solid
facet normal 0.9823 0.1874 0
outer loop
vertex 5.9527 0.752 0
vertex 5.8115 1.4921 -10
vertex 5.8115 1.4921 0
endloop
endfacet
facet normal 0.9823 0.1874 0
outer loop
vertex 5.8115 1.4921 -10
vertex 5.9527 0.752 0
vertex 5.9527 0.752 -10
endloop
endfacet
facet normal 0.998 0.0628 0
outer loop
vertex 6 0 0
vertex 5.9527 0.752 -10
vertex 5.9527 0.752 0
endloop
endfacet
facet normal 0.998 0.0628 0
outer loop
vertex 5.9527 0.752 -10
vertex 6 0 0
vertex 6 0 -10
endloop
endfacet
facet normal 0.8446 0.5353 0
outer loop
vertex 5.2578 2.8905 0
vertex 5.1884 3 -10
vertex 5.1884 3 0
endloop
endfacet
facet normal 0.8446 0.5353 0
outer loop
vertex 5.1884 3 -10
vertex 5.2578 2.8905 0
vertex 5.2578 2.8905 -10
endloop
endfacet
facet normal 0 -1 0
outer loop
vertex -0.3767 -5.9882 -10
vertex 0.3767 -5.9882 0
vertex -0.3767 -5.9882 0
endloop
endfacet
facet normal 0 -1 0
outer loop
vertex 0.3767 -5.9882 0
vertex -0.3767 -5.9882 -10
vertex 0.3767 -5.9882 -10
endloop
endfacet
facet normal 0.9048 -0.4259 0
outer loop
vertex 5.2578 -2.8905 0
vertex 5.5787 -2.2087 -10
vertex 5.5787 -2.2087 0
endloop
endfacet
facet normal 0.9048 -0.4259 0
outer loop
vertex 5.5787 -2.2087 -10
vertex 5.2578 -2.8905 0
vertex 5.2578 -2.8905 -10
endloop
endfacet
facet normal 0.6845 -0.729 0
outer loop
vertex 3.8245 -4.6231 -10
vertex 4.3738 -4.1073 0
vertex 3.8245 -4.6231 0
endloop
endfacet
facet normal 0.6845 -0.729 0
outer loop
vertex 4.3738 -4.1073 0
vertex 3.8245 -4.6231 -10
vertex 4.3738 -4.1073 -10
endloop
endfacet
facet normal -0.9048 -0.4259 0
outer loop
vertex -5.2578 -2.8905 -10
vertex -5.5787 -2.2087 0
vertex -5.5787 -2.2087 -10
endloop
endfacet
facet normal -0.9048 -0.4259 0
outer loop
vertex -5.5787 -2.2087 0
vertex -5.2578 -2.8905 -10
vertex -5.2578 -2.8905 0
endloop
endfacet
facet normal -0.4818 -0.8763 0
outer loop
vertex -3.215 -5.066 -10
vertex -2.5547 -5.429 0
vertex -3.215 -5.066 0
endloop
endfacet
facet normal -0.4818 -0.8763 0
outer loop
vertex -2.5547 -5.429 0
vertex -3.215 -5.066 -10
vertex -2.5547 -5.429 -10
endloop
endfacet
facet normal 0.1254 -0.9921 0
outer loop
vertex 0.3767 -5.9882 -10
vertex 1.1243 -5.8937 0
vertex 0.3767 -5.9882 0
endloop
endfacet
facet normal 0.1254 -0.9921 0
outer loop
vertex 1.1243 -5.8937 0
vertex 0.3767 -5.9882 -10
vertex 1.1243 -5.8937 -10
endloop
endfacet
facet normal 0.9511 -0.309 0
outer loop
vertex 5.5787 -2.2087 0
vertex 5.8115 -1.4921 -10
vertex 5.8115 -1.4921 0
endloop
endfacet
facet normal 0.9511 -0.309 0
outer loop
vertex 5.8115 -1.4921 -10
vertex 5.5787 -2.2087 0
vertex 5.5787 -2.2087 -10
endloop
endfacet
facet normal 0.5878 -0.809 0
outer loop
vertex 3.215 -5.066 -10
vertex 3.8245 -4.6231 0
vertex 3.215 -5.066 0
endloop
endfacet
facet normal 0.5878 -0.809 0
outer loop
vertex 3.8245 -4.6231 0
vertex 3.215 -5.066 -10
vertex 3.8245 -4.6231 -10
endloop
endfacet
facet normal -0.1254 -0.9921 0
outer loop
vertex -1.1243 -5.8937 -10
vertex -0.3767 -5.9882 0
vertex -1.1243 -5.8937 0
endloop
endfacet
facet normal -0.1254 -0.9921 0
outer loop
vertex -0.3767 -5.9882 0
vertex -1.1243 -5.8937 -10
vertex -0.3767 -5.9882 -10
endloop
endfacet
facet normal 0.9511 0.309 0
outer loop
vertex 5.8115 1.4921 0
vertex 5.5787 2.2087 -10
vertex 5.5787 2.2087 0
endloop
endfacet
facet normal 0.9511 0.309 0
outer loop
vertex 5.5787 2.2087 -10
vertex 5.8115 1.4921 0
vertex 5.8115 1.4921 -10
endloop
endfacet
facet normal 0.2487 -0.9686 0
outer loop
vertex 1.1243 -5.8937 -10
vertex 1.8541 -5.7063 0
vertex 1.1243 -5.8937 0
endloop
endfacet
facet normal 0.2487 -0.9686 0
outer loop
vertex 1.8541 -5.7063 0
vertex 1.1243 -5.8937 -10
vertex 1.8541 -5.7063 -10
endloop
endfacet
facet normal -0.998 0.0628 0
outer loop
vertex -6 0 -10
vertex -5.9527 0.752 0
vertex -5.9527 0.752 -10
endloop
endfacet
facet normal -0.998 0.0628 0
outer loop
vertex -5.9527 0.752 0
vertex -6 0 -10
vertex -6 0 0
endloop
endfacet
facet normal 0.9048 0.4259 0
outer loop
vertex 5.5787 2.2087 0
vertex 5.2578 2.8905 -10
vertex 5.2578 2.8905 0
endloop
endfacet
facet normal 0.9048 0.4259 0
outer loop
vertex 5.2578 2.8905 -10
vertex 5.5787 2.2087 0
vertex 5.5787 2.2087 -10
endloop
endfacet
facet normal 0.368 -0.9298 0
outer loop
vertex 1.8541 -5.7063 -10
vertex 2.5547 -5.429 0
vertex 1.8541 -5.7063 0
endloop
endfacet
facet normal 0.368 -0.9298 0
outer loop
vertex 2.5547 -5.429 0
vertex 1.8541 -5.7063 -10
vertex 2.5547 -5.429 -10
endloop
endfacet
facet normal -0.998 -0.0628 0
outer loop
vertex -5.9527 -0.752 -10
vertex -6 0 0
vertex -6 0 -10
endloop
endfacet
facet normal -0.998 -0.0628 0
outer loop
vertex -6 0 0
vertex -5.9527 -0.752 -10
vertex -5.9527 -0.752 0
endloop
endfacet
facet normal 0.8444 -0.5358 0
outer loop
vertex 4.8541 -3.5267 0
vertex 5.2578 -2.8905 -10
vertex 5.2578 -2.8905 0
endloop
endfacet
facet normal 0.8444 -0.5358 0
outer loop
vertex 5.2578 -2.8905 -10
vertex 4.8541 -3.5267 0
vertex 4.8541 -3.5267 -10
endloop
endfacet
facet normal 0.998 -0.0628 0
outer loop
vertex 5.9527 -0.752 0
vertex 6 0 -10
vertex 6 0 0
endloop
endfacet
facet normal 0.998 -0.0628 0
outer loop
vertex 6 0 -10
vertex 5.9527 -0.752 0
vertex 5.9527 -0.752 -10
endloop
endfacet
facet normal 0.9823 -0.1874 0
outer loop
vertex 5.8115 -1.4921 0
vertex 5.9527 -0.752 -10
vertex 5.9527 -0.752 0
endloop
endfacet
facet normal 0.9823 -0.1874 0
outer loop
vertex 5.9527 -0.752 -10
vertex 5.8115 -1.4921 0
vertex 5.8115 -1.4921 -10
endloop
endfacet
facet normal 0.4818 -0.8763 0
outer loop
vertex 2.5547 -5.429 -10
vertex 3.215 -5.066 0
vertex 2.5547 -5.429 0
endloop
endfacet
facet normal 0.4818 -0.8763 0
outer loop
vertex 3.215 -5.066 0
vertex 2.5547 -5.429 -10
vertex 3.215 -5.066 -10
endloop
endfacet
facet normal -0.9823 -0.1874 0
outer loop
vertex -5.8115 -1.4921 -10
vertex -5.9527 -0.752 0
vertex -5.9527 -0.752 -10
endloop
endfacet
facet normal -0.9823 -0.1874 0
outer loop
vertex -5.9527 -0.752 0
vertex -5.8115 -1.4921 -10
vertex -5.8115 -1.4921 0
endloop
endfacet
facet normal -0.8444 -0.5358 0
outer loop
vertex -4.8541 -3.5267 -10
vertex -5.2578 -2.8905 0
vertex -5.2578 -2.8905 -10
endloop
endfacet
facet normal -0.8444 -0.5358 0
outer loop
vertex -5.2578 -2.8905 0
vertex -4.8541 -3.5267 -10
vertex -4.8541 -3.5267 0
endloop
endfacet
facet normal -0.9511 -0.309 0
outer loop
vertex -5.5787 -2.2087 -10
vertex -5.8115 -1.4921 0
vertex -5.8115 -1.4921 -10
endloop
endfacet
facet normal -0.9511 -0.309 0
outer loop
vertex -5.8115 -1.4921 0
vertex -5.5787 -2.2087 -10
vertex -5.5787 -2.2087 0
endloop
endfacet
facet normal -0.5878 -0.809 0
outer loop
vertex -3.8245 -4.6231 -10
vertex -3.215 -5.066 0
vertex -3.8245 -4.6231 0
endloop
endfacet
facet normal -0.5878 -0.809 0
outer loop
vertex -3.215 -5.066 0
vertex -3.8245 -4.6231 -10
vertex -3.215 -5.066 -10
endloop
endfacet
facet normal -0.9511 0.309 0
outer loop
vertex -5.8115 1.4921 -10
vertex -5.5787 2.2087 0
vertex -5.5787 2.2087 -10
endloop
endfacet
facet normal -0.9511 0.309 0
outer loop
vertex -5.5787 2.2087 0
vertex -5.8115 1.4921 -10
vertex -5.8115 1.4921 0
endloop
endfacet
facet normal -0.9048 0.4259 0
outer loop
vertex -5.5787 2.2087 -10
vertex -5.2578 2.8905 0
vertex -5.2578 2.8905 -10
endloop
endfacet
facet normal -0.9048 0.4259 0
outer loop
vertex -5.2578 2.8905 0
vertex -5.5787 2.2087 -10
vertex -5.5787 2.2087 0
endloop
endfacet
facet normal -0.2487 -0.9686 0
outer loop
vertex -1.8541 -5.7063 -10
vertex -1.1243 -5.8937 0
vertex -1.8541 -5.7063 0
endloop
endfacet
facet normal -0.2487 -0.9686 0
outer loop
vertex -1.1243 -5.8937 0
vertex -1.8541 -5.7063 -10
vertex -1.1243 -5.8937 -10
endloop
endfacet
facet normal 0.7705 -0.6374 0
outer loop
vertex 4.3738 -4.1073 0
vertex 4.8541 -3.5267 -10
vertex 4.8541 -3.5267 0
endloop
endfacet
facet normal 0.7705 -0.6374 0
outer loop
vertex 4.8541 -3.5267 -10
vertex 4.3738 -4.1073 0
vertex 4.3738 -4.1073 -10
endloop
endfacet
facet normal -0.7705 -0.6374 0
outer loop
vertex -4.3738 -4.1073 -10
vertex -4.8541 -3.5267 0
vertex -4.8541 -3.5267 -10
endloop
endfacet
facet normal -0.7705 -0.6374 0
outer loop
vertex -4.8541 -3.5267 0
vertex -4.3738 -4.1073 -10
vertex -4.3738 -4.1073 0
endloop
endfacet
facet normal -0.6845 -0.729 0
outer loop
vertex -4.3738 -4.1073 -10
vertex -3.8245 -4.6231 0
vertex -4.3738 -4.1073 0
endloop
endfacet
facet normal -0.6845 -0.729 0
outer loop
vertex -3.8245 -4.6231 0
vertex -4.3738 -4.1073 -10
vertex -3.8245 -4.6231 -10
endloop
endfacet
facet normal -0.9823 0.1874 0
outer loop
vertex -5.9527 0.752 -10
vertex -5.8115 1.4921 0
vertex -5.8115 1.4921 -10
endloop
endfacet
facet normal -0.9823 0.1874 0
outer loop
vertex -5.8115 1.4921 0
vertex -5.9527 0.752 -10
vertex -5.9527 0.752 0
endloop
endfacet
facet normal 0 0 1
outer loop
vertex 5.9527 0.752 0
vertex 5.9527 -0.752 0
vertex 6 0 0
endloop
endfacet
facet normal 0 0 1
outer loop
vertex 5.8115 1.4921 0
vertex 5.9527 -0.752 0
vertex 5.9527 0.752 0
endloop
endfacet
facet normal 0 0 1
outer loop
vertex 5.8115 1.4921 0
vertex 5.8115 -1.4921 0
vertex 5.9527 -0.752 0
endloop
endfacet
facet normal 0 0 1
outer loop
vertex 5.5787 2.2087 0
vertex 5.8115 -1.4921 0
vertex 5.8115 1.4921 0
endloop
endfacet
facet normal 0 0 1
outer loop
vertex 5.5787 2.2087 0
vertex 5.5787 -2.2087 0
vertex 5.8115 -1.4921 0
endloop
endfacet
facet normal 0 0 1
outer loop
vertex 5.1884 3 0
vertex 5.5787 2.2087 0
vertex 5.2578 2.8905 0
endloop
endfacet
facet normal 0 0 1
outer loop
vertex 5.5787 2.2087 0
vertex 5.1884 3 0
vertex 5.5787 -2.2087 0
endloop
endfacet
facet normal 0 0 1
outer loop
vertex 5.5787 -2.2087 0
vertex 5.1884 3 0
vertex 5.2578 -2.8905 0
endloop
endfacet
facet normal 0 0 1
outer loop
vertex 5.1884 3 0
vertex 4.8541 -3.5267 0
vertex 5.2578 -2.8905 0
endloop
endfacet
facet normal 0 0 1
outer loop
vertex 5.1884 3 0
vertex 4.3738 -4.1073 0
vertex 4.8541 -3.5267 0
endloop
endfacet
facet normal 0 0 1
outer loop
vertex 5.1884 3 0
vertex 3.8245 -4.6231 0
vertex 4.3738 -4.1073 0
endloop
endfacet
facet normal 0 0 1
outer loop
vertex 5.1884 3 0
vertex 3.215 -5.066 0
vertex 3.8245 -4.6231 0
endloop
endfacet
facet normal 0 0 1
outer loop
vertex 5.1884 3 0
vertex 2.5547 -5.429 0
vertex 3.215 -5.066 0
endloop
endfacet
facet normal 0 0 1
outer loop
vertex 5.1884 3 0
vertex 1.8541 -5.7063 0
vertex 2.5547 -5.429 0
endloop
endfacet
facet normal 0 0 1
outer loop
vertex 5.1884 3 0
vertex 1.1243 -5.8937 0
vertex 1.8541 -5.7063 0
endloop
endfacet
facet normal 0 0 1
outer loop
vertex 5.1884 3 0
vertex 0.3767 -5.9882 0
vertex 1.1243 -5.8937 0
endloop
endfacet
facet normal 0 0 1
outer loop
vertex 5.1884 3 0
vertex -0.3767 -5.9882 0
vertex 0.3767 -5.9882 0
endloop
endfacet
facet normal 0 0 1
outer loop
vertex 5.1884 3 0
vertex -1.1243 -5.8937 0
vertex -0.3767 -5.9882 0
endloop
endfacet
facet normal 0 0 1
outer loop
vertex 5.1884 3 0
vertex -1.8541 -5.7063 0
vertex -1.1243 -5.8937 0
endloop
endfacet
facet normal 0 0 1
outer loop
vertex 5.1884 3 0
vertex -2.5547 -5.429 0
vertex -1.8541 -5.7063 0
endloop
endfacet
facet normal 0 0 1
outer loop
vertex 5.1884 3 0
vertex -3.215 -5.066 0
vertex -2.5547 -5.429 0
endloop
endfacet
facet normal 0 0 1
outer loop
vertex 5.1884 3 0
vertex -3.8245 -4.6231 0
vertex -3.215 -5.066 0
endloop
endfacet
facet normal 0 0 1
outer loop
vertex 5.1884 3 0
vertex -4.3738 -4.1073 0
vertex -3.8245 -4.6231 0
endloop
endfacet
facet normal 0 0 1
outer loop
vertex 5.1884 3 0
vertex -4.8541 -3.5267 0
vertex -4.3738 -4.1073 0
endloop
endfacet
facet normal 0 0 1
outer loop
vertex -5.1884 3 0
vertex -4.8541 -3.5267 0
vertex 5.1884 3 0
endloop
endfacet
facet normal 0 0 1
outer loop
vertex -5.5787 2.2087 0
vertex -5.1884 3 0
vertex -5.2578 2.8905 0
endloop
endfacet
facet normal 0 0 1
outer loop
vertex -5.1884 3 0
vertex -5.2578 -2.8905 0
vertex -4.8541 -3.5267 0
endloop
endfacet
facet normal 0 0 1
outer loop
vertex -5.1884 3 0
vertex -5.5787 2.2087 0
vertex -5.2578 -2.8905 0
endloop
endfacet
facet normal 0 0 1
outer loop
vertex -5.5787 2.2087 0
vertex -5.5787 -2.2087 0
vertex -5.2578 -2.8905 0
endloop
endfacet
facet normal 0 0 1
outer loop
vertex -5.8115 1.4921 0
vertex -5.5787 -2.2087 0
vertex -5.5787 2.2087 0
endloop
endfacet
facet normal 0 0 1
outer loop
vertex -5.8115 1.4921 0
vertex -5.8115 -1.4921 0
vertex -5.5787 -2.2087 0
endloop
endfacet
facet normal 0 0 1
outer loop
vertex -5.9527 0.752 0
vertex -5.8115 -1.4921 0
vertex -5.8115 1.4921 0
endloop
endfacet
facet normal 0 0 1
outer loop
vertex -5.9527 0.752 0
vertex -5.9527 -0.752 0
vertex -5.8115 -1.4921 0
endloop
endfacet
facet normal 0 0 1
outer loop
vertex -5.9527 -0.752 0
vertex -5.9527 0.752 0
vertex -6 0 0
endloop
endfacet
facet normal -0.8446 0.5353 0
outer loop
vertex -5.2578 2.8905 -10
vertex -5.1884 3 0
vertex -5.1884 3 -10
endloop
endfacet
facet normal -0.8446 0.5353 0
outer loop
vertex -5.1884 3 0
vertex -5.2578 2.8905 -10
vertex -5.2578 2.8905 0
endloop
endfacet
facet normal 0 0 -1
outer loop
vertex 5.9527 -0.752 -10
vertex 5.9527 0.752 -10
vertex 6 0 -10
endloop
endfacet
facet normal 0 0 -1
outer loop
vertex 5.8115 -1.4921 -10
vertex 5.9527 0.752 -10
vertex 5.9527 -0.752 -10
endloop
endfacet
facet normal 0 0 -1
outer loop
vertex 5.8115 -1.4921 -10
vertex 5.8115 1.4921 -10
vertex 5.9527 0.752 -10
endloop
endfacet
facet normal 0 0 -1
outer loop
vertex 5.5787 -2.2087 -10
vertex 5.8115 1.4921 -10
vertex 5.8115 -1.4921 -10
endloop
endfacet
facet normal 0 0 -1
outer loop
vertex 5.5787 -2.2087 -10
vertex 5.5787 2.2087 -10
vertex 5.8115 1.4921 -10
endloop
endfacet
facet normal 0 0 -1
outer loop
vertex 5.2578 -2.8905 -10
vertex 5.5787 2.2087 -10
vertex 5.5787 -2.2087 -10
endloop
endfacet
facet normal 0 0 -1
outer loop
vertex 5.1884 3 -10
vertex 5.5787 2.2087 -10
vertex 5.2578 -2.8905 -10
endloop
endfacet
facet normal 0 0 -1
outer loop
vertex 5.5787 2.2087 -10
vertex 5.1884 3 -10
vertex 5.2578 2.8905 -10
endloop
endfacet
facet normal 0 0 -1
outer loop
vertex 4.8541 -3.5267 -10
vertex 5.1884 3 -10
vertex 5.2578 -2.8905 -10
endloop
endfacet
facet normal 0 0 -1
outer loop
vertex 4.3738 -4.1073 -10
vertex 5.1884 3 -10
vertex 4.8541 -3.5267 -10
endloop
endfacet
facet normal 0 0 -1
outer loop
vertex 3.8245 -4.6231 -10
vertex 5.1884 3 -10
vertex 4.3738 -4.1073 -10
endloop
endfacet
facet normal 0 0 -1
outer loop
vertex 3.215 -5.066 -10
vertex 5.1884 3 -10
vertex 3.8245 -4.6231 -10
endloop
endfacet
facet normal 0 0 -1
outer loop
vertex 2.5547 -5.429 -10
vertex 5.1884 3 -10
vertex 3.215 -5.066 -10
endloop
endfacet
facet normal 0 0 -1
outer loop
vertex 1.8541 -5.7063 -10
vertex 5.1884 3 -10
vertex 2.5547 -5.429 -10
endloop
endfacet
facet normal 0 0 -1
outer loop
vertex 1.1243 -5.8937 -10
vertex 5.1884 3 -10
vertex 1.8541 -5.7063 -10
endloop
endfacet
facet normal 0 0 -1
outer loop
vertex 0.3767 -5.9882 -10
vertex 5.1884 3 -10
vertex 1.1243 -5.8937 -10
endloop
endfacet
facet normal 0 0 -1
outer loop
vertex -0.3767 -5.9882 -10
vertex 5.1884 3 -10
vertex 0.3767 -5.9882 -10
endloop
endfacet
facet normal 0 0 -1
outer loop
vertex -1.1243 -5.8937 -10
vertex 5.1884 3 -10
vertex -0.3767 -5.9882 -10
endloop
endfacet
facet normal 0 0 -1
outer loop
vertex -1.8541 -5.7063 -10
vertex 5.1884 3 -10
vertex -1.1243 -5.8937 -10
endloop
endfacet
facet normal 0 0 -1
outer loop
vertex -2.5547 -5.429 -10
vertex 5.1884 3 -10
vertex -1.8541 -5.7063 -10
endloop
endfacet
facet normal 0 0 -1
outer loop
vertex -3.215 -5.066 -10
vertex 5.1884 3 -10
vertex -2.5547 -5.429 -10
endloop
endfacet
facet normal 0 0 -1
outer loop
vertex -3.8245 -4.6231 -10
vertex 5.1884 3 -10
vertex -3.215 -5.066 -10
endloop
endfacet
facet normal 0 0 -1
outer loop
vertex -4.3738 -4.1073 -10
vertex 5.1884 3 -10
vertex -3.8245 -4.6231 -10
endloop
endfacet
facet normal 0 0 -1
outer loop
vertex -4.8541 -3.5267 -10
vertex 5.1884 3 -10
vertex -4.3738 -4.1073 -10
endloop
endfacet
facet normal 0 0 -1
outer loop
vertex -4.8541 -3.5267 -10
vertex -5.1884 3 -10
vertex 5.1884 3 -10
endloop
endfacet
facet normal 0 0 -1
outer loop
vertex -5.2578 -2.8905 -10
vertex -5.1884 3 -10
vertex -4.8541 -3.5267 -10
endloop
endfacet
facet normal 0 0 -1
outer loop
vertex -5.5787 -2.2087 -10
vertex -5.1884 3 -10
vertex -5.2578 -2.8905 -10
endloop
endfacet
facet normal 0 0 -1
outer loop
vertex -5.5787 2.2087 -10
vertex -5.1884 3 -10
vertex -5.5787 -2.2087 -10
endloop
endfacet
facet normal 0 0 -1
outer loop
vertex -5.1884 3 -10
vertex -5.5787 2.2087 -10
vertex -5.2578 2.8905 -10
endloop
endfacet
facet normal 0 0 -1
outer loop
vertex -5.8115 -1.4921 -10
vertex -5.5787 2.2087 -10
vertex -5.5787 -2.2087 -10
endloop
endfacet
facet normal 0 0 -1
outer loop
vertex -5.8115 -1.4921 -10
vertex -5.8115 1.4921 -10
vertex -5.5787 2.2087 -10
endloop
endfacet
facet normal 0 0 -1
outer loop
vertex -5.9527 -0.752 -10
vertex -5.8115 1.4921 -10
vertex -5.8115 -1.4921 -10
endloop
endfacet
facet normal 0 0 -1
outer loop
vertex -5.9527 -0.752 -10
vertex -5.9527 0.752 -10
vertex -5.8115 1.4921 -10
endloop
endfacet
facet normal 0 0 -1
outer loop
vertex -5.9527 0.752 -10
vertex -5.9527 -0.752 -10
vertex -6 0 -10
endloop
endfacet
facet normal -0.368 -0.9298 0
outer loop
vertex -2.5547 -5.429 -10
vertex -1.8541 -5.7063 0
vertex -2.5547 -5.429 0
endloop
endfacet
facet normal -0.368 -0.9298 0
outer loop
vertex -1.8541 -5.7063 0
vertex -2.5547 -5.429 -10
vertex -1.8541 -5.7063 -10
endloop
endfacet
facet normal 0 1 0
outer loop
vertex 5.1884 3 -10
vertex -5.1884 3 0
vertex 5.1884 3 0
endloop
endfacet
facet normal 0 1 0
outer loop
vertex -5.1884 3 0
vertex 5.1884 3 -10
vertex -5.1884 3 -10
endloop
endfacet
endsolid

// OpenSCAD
$fn = 50;

difference() {
	union() {
		difference() {
			translate(v = [0, 0, -10]) {
				cylinder(h = 10, r = 6);
			}
			translate(v = [-6, 3, -10]) {
				cube(size = [12, 3, 10]);
			}
		}
	}
	union();
}
